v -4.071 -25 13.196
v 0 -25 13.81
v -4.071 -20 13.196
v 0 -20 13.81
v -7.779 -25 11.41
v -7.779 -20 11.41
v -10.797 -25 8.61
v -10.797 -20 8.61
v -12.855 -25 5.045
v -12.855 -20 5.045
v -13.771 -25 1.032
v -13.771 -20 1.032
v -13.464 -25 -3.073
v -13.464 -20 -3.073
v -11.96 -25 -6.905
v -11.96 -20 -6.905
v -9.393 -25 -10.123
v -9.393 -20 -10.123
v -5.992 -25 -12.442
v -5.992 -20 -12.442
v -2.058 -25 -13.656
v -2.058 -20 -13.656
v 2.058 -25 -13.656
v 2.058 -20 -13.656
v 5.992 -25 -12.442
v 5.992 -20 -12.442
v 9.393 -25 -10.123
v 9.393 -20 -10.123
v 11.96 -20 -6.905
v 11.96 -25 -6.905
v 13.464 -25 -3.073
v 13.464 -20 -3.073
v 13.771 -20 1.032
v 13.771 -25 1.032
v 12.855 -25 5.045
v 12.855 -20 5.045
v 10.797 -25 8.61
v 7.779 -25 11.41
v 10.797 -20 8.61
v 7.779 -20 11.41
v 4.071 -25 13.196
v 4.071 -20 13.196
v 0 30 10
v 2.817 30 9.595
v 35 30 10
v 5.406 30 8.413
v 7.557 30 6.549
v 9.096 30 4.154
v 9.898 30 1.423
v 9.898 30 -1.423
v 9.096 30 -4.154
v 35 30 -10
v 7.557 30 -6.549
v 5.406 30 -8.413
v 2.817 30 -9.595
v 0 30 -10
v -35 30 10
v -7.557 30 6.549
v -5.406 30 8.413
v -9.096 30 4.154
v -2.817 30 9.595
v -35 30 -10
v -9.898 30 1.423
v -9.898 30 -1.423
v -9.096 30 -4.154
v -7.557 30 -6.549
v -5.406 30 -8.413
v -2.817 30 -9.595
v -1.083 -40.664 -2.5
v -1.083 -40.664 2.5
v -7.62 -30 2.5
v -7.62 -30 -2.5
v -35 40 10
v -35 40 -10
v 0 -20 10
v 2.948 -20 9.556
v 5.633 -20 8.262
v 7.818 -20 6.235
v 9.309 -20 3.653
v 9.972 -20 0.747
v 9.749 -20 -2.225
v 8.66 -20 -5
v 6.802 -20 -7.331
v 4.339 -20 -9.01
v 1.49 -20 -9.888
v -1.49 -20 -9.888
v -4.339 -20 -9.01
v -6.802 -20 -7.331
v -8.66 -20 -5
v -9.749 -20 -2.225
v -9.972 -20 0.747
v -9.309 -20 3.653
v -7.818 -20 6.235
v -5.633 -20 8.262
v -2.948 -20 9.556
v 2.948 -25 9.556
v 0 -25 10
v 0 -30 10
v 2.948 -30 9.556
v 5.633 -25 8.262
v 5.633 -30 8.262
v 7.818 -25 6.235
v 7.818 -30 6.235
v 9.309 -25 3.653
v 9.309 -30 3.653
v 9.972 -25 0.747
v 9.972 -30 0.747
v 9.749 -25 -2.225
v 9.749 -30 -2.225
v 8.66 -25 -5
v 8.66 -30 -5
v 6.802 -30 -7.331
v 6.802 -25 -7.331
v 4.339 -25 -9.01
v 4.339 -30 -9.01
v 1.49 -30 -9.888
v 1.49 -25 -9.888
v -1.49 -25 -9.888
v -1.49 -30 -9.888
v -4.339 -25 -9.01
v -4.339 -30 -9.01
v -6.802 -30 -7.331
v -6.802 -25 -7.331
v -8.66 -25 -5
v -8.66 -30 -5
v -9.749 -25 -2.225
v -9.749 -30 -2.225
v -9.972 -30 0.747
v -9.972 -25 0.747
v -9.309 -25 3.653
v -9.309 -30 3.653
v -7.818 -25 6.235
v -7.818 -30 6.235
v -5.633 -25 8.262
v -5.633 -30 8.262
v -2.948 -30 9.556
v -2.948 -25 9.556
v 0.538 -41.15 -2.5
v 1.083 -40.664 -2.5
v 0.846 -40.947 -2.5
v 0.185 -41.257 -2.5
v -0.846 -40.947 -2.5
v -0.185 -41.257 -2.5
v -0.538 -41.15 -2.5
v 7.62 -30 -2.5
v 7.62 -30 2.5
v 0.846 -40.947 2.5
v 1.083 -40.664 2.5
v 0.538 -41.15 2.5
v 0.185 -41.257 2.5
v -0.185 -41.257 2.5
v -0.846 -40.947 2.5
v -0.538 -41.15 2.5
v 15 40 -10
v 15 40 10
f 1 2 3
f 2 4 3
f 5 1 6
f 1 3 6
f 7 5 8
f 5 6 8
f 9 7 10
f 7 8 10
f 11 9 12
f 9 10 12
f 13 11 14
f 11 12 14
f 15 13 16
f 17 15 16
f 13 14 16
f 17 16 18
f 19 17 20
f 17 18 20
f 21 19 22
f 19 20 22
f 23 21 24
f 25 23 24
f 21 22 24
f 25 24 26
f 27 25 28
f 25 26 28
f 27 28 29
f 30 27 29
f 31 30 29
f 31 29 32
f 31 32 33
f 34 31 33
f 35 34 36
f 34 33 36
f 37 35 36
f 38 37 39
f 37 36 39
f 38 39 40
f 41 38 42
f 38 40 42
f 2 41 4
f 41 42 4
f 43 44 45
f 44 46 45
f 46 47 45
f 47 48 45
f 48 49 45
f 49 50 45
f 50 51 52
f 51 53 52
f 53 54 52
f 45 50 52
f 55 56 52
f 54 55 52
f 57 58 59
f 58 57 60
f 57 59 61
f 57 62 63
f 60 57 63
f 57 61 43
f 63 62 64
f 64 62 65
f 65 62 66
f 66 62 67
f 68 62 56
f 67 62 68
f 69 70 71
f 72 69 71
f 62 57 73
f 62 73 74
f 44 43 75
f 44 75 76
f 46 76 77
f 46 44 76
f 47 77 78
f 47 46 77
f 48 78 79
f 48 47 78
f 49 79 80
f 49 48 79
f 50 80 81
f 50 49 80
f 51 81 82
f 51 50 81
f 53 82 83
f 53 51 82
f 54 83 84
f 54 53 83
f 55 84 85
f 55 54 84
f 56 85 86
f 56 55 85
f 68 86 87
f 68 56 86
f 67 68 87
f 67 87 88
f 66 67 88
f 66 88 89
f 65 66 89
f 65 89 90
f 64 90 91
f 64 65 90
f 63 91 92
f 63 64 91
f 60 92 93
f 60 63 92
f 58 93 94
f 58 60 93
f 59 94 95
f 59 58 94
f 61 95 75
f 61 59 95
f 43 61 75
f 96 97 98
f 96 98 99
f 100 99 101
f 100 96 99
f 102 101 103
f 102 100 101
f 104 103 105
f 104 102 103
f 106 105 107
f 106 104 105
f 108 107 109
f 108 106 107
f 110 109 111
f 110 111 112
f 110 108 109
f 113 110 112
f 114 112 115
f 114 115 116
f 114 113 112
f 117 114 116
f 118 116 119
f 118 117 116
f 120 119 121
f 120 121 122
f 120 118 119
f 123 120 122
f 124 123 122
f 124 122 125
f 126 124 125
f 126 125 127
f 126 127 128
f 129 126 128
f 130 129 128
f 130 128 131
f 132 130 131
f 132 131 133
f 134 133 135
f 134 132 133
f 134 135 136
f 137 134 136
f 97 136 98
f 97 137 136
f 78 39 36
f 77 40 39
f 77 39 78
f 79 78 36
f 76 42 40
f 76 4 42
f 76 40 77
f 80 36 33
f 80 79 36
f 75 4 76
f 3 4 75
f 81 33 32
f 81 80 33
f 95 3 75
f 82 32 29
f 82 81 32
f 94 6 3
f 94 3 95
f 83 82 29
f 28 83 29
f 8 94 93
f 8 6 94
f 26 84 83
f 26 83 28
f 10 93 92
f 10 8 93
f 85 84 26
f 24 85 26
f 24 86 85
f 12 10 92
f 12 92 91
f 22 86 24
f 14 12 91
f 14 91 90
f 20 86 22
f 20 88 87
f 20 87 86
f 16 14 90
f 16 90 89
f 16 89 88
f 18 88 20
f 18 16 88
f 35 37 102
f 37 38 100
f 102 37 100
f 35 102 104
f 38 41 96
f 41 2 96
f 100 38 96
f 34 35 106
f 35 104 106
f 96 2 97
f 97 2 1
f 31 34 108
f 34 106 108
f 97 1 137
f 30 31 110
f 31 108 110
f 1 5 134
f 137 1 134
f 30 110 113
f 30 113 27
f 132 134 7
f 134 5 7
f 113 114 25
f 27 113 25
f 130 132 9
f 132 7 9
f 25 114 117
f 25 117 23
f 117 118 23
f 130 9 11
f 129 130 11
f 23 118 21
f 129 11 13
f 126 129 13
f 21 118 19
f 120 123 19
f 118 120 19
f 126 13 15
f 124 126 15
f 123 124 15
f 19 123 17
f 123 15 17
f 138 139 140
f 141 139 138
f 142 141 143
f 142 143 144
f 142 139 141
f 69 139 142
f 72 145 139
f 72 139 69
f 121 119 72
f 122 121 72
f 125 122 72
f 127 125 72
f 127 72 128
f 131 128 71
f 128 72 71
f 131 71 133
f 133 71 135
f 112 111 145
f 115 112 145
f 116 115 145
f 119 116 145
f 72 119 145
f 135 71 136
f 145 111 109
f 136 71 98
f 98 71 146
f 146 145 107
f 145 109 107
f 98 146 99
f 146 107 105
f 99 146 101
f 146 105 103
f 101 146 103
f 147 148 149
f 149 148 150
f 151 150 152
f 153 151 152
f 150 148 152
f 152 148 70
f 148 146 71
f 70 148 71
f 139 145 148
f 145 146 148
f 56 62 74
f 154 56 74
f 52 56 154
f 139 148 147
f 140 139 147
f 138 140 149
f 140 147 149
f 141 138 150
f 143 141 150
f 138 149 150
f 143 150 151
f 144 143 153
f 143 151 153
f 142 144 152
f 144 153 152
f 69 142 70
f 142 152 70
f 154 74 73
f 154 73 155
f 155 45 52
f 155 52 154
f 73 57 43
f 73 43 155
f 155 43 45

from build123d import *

# Parameters (mm, degrees)
CROQUIS2_R              = 10
SALIENTE_EXTRUIR1_DEPTH = 30
SALIENTE_EXTRUIR2_DEPTH = 2.5
CROQUIS4_W              = 3.81
CROQUIS4_H              = 5
CROQUIS5_W              = 70
CROQUIS5_H              = 20
SALIENTE_EXTRUIR3_DEPTH = 10
CORTAR_EXTRUIR1_DEPTH   = 20


with BuildPart() as part:
    # Croquis2 → Saliente-Extruir1 (new, symmetric)
    with BuildSketch(Plane(origin=(0, 0, 0), x_dir=(1, 0, 0), z_dir=(0, 1, 0))):
        Circle(CROQUIS2_R)
    extrude(amount=SALIENTE_EXTRUIR1_DEPTH, both=True)

    # Croquis3 → Saliente-Extruir2 (add, symmetric)
    with BuildSketch(Plane.XY):
        with BuildLine():
            Line((-1.082739864, -40.663757777), (-7.62, -30))
            Line((-7.62, -30), (7.62, -30))
            Line((7.62, -30), (1.082739864, -40.663757777))
            ThreePointArc((1.082739864, -40.663757777), (0, -41.27), (-1.082739864, -40.663757777))
        make_face()
    extrude(amount=SALIENTE_EXTRUIR2_DEPTH, both=True)

    # Croquis4 → Revolución1 (revolve)
    with BuildSketch(Plane.XY):
        with Locations((11.905, -22.5)):
            Rectangle(CROQUIS4_W, CROQUIS4_H)
    revolve(axis=Axis((0, -30, 0), (0, -1, 0)))

    # Croquis5 → Saliente-Extruir3 (add)
    with BuildSketch(Plane(origin=(0, 30, 0), x_dir=(1, 0, 0), z_dir=(0, 1, 0))):
        Rectangle(CROQUIS5_W, CROQUIS5_H)
    extrude(amount=SALIENTE_EXTRUIR3_DEPTH)

    # Croquis6 → Cortar-Extruir1 (cut)
    with BuildSketch(Plane.XY.offset(10)):
        Polygon((35, 30), (15, 40), (35, 40), align=None)
    extrude(amount=-CORTAR_EXTRUIR1_DEPTH, mode=Mode.SUBTRACT)


solid = part.part
